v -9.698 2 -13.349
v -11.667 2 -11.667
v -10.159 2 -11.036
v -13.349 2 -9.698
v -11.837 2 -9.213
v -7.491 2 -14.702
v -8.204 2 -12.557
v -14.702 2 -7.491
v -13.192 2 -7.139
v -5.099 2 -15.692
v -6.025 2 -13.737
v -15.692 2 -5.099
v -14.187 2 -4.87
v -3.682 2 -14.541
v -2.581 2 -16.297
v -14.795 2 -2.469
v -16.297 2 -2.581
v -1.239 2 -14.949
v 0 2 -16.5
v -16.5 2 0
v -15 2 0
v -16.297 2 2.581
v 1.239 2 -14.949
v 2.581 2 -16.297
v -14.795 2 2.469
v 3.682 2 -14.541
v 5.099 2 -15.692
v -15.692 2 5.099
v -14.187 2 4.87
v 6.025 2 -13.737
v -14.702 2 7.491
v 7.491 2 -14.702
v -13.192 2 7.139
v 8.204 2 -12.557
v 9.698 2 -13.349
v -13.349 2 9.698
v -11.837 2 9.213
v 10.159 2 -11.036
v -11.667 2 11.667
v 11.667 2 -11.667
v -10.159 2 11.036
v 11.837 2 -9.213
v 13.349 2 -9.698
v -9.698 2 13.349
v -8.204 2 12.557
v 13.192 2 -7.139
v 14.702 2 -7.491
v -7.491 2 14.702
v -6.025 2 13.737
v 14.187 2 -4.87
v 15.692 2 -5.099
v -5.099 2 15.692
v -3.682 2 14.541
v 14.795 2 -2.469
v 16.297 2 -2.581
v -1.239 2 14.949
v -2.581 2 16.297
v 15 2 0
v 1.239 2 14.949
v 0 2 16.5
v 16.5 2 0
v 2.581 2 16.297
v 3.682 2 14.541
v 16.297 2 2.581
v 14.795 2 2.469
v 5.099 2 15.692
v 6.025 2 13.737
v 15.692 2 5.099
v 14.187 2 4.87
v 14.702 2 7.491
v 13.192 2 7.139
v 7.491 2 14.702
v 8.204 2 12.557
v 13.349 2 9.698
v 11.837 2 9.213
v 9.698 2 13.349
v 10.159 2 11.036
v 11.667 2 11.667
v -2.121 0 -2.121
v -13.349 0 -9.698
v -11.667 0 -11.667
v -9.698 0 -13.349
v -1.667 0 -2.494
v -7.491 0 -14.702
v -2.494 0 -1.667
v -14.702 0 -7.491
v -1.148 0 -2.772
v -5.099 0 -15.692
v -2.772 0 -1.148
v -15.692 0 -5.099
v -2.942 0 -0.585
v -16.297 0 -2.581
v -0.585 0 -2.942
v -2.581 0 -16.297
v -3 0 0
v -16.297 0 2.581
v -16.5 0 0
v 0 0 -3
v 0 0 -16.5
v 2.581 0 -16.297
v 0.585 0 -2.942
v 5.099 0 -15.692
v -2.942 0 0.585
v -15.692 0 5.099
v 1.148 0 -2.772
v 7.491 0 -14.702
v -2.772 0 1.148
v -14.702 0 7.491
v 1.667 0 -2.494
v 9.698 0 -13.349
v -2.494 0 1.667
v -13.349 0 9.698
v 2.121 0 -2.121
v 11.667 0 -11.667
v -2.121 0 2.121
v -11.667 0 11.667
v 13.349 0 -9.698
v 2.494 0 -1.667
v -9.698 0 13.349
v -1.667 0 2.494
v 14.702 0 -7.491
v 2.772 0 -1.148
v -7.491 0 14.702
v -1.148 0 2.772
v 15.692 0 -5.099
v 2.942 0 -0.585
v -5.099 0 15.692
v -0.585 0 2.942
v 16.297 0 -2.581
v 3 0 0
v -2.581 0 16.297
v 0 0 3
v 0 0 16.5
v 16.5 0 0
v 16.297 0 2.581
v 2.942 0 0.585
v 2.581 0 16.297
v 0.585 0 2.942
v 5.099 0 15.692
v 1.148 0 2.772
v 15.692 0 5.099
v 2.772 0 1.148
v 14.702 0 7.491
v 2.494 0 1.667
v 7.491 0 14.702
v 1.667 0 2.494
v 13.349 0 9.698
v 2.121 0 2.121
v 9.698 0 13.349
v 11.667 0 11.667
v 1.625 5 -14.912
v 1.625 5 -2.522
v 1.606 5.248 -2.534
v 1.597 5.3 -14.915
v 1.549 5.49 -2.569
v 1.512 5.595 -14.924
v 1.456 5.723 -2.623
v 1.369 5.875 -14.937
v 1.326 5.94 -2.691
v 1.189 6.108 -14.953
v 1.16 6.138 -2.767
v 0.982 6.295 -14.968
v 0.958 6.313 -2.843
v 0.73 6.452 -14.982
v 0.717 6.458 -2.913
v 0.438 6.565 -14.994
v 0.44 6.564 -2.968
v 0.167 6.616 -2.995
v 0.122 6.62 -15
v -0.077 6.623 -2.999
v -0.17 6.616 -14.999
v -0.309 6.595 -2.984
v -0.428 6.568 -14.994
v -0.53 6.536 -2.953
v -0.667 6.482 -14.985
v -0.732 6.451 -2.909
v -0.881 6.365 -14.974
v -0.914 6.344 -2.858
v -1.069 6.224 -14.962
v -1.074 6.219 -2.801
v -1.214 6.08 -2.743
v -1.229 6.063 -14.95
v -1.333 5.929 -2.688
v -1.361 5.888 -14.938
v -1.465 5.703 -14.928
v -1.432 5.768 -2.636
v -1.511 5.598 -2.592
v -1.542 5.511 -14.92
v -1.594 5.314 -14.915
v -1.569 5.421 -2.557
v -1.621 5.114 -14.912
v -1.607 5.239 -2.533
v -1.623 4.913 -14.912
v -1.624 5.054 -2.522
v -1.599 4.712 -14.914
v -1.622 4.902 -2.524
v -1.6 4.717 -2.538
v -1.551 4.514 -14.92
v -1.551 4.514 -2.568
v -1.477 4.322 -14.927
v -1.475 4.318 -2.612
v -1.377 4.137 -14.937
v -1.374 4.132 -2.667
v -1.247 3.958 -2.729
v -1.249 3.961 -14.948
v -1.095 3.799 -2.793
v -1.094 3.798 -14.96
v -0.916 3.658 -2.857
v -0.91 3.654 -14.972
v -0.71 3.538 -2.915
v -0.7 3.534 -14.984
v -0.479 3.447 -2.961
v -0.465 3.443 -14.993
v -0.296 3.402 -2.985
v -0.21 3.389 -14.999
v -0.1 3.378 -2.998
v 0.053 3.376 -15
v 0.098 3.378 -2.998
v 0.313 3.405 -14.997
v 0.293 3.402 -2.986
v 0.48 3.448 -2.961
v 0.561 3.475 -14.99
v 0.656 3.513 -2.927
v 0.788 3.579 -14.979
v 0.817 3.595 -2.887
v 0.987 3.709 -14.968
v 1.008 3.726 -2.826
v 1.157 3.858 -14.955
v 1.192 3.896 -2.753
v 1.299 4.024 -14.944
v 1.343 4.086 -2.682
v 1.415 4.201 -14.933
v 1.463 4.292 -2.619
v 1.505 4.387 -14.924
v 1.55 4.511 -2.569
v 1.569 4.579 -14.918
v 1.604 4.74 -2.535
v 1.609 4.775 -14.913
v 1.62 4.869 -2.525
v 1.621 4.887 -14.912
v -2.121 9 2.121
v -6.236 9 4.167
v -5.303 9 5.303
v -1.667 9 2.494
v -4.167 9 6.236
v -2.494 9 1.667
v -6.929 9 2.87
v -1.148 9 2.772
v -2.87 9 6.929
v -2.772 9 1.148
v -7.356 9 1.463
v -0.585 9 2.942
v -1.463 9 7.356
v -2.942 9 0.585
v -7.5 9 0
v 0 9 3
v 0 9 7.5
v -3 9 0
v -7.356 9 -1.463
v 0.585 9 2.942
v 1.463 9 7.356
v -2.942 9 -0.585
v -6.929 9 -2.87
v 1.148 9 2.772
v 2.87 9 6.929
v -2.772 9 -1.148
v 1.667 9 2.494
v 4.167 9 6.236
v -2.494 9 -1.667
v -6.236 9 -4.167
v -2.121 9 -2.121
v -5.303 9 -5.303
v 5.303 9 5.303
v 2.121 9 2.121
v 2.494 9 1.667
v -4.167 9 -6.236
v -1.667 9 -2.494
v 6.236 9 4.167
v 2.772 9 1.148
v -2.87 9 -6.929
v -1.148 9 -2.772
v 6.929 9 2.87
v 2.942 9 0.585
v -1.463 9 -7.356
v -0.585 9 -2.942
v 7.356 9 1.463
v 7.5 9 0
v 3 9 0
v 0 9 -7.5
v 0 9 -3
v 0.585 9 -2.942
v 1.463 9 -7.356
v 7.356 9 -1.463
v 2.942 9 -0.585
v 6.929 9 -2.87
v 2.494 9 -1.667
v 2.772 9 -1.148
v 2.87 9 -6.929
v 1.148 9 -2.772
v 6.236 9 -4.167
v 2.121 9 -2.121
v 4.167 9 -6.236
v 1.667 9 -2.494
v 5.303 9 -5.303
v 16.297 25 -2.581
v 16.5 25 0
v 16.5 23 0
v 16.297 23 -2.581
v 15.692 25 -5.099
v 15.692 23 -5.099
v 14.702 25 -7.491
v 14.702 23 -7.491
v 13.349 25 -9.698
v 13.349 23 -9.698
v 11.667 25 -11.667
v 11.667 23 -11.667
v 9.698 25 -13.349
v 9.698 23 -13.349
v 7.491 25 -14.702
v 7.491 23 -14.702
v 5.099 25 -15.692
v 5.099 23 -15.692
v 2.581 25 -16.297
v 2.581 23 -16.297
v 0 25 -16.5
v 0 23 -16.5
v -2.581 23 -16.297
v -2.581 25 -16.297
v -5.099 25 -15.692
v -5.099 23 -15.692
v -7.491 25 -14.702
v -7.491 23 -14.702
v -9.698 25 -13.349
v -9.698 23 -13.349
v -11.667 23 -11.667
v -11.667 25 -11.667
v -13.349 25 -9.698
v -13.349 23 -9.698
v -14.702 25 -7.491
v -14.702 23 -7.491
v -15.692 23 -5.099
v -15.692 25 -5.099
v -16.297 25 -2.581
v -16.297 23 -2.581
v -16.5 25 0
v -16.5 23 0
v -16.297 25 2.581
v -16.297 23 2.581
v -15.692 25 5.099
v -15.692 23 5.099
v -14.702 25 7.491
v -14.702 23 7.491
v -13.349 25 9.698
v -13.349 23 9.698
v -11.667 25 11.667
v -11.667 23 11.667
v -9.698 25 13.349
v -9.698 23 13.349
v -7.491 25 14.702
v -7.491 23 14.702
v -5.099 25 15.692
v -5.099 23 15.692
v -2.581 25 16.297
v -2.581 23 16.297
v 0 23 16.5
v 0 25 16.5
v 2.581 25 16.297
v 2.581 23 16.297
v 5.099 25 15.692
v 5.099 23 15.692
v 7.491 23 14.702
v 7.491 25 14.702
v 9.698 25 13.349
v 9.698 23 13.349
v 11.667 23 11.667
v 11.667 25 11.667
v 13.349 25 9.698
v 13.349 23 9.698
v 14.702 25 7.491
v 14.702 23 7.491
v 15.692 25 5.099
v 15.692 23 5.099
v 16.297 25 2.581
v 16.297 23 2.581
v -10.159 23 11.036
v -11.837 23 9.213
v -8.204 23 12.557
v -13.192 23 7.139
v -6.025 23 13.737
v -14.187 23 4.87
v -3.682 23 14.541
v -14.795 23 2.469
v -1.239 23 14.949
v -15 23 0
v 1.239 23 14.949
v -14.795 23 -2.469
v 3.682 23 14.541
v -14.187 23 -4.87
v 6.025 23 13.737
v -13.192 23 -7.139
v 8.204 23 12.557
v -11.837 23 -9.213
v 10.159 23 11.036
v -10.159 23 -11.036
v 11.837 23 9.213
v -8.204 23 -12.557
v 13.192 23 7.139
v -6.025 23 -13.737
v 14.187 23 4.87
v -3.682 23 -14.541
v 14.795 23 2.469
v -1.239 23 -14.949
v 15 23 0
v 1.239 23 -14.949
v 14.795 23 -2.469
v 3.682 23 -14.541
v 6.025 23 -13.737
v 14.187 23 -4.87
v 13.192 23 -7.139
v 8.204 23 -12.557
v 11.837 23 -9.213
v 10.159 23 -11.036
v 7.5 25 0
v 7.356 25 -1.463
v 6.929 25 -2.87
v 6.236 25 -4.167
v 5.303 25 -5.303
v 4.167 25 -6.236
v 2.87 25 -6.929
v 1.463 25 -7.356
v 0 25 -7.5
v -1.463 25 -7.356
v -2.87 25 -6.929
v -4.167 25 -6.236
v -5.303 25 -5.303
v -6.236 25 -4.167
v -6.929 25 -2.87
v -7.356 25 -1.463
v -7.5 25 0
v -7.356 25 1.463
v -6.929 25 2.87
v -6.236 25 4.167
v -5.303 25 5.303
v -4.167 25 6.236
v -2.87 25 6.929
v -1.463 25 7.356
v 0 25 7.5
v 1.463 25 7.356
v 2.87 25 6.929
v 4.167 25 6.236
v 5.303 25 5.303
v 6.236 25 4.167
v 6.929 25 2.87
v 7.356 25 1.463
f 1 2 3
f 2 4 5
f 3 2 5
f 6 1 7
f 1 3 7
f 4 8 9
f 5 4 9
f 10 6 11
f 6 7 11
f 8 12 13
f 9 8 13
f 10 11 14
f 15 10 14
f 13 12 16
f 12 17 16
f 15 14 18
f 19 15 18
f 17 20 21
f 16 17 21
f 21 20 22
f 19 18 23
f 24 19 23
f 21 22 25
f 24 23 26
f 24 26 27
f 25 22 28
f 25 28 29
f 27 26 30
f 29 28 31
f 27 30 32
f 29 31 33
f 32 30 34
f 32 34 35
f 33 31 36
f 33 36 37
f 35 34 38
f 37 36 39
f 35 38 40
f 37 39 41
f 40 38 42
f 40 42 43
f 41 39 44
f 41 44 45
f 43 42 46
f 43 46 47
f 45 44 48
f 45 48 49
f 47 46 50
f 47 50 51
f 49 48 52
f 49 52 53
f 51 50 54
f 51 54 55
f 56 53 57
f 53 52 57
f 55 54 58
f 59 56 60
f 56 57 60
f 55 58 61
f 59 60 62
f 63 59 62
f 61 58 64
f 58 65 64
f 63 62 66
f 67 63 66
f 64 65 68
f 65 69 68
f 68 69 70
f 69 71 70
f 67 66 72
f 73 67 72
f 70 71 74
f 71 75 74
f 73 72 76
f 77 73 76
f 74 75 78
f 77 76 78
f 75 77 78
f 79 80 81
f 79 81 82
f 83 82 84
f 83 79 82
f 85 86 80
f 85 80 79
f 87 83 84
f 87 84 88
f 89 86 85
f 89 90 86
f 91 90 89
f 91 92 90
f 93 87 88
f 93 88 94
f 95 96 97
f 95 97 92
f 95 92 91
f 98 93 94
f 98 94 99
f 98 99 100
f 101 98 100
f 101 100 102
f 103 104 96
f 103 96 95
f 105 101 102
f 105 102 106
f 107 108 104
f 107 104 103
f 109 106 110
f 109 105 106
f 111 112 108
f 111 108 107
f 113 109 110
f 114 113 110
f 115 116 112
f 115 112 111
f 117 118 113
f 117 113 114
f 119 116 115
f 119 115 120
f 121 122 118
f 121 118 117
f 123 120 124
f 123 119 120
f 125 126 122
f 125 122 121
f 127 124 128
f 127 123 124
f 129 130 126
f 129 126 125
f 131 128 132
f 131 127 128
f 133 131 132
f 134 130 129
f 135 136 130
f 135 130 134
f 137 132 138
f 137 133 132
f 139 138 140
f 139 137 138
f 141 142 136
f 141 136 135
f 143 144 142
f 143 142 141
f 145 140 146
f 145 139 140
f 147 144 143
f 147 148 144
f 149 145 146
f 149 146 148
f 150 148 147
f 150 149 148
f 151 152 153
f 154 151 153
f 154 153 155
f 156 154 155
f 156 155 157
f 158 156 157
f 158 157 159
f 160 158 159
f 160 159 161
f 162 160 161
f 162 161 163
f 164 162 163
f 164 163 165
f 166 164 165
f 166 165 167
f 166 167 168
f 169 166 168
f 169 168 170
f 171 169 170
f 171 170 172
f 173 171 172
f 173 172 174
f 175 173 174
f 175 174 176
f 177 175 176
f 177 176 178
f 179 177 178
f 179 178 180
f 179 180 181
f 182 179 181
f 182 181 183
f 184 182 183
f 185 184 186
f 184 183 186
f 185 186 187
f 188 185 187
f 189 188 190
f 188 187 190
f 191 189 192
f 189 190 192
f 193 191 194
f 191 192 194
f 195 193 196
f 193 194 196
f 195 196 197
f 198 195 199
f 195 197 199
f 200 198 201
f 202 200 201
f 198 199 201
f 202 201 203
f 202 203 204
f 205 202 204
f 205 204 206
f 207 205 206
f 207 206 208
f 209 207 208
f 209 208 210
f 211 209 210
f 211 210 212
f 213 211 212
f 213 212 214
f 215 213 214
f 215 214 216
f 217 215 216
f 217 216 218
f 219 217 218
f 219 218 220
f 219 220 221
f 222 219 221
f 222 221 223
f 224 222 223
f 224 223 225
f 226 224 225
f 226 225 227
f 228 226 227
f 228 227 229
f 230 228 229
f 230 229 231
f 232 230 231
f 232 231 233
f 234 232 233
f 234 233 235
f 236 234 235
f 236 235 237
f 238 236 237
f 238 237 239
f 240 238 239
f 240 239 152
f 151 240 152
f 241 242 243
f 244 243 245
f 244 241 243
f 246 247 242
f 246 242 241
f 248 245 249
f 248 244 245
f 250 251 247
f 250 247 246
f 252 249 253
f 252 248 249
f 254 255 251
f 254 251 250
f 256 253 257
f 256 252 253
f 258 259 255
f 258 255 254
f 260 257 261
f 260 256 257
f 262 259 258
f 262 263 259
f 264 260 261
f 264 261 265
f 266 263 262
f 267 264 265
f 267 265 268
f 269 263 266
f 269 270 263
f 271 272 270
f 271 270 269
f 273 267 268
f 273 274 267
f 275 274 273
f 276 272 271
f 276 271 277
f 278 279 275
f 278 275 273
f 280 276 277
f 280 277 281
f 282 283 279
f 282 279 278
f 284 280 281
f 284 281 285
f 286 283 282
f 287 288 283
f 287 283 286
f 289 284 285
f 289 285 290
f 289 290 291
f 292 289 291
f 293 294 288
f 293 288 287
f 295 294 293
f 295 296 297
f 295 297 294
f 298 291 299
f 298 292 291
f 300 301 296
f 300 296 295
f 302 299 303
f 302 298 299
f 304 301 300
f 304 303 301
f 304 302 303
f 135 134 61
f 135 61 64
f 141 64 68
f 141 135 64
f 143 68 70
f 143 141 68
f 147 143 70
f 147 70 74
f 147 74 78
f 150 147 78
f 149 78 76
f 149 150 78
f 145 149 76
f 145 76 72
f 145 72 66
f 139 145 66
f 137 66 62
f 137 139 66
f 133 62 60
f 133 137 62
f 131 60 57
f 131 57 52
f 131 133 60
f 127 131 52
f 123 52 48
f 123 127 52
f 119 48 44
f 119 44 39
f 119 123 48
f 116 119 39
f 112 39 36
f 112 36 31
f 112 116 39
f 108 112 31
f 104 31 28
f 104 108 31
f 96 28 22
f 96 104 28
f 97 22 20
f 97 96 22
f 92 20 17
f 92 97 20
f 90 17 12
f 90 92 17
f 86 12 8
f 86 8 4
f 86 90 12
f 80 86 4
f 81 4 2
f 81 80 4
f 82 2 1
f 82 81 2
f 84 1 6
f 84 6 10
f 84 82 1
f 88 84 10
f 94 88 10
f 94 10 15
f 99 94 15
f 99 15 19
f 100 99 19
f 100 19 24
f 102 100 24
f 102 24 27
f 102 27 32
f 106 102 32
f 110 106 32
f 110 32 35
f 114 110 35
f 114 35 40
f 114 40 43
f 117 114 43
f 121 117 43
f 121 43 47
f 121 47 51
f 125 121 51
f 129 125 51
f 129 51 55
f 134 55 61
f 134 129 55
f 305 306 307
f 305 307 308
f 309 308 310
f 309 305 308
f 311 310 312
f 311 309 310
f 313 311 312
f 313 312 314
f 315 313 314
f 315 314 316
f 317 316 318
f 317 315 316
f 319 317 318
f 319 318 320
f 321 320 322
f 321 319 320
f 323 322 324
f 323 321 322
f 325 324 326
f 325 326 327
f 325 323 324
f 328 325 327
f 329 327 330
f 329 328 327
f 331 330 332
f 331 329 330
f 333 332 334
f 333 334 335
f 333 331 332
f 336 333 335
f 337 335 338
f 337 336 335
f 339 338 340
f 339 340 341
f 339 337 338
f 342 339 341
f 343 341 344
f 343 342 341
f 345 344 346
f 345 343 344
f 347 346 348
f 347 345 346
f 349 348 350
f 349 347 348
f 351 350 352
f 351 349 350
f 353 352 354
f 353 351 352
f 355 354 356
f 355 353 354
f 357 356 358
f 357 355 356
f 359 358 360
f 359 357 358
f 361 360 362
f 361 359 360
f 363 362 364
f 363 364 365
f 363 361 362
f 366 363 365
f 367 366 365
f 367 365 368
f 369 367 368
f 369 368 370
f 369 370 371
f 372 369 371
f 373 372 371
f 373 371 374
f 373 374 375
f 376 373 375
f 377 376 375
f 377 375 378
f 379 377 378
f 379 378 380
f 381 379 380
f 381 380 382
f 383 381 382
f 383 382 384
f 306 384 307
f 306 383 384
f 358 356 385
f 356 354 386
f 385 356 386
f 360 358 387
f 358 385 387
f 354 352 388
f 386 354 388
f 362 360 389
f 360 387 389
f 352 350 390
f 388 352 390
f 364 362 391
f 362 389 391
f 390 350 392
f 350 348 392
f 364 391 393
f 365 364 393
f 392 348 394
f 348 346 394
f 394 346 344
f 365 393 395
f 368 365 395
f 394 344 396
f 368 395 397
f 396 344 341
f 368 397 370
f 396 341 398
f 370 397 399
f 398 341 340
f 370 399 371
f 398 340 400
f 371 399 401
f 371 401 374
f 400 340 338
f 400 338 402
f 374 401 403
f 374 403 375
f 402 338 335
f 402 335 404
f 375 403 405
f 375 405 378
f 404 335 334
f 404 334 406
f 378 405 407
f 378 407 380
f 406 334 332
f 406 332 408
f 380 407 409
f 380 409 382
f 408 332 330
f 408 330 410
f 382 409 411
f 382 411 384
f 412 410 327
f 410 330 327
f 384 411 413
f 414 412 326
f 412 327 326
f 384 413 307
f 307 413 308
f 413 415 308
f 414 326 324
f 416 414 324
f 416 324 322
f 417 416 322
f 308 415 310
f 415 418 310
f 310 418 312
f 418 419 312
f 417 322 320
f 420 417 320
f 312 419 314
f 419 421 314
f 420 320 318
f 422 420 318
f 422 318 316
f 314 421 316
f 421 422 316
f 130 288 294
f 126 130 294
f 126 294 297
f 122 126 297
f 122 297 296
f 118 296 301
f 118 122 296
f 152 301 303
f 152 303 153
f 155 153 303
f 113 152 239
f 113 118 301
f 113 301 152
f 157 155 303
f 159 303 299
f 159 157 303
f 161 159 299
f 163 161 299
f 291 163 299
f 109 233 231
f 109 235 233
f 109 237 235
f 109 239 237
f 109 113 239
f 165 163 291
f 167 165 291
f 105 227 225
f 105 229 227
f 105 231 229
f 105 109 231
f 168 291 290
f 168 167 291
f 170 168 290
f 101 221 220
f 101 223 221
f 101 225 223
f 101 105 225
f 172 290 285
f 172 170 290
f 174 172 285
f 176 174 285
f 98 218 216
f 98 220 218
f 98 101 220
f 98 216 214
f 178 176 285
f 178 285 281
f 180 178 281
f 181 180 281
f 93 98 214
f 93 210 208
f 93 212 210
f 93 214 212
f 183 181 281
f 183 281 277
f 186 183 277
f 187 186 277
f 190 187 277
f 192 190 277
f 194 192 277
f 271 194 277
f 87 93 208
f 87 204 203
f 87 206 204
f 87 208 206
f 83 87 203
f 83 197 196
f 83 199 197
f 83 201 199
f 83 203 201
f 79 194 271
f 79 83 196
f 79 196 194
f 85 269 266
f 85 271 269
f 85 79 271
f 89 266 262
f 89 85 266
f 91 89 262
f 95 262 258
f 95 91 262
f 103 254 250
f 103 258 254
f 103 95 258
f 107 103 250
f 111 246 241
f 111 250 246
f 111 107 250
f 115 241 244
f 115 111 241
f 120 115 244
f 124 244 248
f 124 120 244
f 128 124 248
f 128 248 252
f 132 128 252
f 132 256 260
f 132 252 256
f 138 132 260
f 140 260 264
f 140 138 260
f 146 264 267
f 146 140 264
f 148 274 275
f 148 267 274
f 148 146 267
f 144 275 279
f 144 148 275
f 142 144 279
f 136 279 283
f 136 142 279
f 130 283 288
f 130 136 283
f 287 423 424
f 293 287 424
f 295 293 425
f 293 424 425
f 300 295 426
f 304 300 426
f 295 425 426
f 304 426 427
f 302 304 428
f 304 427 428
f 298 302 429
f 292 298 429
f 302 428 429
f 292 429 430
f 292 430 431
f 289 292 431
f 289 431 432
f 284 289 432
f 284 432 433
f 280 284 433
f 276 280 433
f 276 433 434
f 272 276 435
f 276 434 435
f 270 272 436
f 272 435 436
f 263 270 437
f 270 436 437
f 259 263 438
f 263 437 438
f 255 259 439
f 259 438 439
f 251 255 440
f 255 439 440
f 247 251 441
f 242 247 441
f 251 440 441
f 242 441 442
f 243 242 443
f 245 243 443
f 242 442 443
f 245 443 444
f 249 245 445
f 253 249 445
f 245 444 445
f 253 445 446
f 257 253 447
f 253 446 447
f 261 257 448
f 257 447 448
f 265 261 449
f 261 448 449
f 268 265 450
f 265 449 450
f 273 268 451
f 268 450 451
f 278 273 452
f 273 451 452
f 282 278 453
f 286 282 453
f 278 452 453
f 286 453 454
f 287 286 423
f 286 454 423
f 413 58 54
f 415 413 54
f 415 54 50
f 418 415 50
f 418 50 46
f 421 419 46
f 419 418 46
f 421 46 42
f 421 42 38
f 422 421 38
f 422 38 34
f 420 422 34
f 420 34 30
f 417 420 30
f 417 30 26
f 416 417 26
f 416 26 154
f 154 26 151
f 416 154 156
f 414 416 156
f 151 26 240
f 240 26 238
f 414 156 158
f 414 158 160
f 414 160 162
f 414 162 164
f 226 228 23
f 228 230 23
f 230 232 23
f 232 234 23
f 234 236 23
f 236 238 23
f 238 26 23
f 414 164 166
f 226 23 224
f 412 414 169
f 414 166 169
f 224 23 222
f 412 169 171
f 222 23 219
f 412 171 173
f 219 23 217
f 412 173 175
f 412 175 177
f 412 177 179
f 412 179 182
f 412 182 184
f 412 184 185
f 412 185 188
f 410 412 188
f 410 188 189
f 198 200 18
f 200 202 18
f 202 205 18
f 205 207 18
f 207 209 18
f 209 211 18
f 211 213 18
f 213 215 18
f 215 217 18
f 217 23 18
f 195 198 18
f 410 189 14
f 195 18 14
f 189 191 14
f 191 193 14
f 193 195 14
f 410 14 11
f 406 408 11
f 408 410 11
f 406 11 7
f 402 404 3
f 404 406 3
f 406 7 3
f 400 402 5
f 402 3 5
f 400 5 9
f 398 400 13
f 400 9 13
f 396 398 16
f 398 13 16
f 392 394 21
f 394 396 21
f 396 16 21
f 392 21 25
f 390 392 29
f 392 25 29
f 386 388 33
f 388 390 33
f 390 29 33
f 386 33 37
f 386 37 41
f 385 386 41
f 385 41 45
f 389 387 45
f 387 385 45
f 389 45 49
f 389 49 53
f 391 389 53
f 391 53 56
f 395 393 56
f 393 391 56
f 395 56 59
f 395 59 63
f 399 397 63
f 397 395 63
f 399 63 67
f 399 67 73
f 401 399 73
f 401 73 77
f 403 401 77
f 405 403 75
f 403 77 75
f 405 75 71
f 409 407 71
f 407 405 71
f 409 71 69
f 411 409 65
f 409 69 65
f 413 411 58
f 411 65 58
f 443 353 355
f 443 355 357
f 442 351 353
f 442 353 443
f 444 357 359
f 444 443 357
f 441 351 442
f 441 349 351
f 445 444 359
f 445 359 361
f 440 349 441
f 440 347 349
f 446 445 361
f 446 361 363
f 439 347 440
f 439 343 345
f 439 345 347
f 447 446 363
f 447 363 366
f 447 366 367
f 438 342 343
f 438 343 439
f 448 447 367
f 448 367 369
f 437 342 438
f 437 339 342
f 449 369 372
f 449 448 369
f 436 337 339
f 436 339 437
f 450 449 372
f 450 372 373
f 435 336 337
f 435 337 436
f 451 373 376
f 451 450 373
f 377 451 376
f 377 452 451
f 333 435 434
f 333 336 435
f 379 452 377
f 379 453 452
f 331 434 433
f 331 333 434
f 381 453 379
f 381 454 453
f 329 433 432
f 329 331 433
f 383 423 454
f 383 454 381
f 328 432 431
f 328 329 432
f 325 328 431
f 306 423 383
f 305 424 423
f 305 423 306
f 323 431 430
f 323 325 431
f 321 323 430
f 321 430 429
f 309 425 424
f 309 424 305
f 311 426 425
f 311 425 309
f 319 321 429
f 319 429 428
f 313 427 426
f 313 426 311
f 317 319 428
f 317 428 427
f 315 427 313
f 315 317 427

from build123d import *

# Parameters (mm, degrees)
CROQUIS1_R              = 15
CROQUIS1_R_2            = 3
SALIENTE_EXTRUIR1_DEPTH = 25
CROQUIS2_R              = 16.5
CROQUIS2_R_2            = 3
SALIENTE_EXTRUIR2_DEPTH = 2
CROQUIS3_R              = 16.5
CROQUIS3_R_2            = 3
SALIENTE_EXTRUIR3_DEPTH = 2
CORTAR_EXTRUIR1_REACH   = 18.5
CROQUIS4_R              = 1.625
CROQUIS5_R              = 7.5
CORTAR_EXTRUIR2_DEPTH   = 16


with BuildPart() as part:
    # Croquis1 → Saliente-Extruir1 (new body)
    with BuildSketch(Plane(origin=(0, 0, 0), x_dir=(1, 0, 0), z_dir=(0, 1, 0))):
        Circle(CROQUIS1_R)
        Circle(CROQUIS1_R_2, mode=Mode.SUBTRACT)
    extrude(amount=SALIENTE_EXTRUIR1_DEPTH)

    # Croquis2 → Saliente-Extruir2 (add)
    with BuildSketch(Plane.XZ):
        Circle(CROQUIS2_R)
        Circle(CROQUIS2_R_2, mode=Mode.SUBTRACT)
    extrude(amount=-SALIENTE_EXTRUIR2_DEPTH)

    # Croquis3 → Saliente-Extruir3 (add)
    with BuildSketch(Plane(origin=(0, 25, 0), x_dir=(1, 0, 0), z_dir=(0, 1, 0))):
        Circle(CROQUIS3_R)
        Circle(CROQUIS3_R_2, mode=Mode.SUBTRACT)
    extrude(amount=-SALIENTE_EXTRUIR3_DEPTH)

    # Croquis4 → Cortar-Extruir1 (cut, up to next)
    with BuildSketch(Plane.XY, mode=Mode.PRIVATE) as cortar_extruir1_sk1:
        with Locations((0, 5)):
            Circle(CROQUIS4_R)
    cortar_extruir1_tool1 = extrude(cortar_extruir1_sk1.sketch, amount=-CORTAR_EXTRUIR1_REACH, mode=Mode.PRIVATE) & part.part
    add(cortar_extruir1_tool1.solids().sort_by_distance((0, 5, 0))[0], mode=Mode.SUBTRACT)

    # Croquis5 → Cortar-Extruir2 (cut)
    with BuildSketch(Plane(origin=(0, 25, 0), x_dir=(1, 0, 0), z_dir=(0, 1, 0))):
        Circle(CROQUIS5_R)
    extrude(amount=-CORTAR_EXTRUIR2_DEPTH, mode=Mode.SUBTRACT)


solid = part.part
